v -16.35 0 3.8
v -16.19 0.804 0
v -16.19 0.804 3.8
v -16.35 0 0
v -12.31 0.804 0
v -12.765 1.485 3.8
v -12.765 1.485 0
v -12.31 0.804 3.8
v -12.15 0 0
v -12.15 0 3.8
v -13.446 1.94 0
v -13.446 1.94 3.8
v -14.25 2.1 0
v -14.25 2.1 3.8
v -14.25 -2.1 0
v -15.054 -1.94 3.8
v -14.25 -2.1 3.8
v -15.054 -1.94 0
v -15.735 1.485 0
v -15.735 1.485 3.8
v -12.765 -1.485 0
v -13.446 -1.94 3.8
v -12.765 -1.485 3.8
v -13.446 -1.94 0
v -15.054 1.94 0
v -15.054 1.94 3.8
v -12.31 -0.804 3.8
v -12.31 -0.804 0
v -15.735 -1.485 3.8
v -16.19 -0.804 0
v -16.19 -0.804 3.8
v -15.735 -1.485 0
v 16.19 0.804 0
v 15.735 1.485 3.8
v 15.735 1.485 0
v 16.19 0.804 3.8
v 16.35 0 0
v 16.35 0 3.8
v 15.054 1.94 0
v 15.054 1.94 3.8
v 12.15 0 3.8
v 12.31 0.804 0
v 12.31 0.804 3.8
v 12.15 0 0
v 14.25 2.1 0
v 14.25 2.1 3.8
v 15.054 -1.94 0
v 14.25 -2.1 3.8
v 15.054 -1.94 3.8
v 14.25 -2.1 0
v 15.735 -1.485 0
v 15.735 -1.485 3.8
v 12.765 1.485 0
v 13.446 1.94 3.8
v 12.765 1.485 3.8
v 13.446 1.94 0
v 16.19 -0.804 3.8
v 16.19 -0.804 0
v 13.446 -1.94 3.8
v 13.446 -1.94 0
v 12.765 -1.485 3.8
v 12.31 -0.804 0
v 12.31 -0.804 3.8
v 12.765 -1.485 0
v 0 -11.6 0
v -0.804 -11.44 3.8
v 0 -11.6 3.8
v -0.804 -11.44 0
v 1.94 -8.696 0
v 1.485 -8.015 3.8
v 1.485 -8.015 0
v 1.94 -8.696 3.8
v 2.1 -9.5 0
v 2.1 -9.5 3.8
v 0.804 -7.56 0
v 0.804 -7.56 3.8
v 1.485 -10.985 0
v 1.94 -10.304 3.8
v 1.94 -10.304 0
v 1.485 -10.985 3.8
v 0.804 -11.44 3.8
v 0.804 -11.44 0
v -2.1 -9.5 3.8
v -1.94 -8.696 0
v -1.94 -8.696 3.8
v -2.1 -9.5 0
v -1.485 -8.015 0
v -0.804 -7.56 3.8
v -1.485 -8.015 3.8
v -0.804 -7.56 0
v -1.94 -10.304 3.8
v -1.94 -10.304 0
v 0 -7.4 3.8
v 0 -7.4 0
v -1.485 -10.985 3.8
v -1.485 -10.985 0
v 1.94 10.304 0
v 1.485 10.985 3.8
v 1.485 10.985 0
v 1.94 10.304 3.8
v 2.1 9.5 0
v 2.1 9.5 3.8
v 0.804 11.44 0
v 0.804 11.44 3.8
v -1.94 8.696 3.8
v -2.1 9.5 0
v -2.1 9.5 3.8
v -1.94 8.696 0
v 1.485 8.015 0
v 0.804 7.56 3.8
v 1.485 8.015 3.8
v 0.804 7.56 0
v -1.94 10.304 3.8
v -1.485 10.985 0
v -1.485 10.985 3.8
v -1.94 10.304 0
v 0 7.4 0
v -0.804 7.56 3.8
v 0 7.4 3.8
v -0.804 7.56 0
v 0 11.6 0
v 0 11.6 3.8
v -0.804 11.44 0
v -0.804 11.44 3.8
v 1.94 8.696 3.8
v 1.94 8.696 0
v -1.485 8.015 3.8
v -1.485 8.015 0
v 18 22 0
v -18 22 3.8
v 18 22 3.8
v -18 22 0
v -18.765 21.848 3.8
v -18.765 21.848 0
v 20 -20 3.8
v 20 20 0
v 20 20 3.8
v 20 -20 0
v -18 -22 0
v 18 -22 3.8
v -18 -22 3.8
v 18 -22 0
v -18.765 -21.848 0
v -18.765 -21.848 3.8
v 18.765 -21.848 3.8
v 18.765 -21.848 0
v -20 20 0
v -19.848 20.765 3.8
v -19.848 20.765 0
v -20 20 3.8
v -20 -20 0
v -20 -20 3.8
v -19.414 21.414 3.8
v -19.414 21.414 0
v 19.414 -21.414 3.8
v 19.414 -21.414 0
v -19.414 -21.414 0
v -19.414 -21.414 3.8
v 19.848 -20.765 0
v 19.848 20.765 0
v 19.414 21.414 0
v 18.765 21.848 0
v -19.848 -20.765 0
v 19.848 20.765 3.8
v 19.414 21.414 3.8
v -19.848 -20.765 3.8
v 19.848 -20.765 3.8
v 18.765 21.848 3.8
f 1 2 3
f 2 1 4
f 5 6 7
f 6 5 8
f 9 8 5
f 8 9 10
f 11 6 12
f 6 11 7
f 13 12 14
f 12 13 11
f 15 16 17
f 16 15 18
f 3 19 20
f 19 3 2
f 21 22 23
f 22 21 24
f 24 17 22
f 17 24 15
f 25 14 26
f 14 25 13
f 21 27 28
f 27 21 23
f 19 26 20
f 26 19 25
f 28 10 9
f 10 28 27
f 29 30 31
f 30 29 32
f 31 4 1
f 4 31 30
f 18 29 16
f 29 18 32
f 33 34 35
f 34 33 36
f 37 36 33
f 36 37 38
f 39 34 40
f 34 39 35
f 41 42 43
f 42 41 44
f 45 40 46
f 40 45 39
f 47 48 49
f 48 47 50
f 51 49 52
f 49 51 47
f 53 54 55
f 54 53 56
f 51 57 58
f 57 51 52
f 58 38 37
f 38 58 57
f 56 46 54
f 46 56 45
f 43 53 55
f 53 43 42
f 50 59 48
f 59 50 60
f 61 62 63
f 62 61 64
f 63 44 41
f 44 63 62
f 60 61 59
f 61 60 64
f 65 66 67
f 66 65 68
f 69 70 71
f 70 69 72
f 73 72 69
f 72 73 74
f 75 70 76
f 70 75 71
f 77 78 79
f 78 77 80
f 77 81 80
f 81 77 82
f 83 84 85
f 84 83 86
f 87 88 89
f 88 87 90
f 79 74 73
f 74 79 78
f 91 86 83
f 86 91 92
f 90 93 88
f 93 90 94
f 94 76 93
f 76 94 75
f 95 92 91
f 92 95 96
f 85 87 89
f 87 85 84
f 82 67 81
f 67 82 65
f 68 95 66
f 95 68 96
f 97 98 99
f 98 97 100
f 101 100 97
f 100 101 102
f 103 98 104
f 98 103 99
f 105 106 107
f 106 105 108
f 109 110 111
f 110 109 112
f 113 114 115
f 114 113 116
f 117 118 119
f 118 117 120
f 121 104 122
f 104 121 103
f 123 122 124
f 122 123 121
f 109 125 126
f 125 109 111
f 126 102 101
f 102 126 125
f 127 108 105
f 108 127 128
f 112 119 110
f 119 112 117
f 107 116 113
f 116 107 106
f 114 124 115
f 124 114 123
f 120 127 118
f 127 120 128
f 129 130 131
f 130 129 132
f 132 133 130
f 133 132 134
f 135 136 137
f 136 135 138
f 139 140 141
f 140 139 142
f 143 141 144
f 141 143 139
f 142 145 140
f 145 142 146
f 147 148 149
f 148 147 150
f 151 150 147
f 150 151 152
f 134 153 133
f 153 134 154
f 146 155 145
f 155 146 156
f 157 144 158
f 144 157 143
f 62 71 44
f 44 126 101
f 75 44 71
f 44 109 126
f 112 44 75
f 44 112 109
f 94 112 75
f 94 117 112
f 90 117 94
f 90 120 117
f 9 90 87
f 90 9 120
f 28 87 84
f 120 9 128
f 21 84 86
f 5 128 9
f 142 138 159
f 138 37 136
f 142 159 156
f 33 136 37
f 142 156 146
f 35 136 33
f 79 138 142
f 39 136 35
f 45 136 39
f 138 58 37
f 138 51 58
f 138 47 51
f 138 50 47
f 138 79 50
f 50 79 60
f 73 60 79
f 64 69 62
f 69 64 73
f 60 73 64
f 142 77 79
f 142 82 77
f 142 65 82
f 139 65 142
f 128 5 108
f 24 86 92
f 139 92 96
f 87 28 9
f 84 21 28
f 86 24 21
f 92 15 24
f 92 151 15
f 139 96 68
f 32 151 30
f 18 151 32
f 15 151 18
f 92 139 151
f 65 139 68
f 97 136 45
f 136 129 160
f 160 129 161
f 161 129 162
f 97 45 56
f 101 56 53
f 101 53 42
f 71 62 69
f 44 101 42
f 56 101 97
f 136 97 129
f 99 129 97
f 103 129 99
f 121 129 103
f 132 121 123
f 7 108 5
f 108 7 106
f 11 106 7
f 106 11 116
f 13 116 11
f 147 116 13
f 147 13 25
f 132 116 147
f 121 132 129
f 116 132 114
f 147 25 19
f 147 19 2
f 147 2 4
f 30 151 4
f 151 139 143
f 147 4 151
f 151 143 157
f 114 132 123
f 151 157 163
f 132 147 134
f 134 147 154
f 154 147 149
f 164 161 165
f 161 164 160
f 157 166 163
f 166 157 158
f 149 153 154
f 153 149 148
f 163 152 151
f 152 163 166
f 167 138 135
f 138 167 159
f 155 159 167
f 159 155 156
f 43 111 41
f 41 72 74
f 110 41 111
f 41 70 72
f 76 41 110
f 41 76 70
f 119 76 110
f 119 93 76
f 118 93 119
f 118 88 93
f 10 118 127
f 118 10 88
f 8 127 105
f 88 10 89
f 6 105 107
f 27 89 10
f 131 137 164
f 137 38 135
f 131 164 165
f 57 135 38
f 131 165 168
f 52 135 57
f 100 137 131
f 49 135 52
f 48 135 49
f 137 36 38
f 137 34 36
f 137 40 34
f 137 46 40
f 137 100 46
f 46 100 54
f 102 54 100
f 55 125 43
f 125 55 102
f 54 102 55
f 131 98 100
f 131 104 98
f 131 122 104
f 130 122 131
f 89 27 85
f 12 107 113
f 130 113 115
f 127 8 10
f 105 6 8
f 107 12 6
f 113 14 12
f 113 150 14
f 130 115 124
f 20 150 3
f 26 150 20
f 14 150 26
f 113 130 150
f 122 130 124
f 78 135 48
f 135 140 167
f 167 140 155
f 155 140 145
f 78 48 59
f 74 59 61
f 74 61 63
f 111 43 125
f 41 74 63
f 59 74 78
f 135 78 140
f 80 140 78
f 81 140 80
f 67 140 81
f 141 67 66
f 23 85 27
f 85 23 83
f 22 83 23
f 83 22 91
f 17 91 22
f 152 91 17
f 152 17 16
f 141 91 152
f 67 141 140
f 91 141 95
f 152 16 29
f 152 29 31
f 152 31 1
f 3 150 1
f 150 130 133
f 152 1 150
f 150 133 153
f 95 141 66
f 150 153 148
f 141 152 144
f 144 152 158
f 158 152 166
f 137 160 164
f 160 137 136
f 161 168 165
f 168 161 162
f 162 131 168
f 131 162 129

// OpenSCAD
// Probleme en suspens:
//  - vérifier les cnx jack (2.5 vs 2.1 vs 1x GX16)
//  - hauteur des plots pour les soudure: 1.8 - 2 min => ok
//  - erreur 3V3 vs 3V3_enable
// Historique des problemes
// emplacement ecrous pas assez hauts 0.2/profonds 0.1 => ok, +0.2 et +0.1
// Aggrandir légerement les passage M3: 3.2 => 3.25
// Passe cable USB: on décalle de 16 le meteo temp, et on met un passe cable fin en face les fw_drv => ok
// Impossible de dévisser le capot sans dévisser la saddle => trou de 6.2 et supprimer l'écrou => ok

module cube_rounded(sze, ray) {
  function dir(d) = (d == 0 ? 1 : -1);
  hull() {
    for(X = [0, 1])
      for(Y = [0, 1])
        translate([X * sze[0] + dir(X) * ray, Y * sze[1] + dir(Y) * ray, 0])
          cylinder(r = ray, h=sze[2]);
    }
}

// RJ45:
//          w
//
//       xxxxxxxx
//    h  x      x
//       xxx  xxx
//
rj45_w=15.3;
rj45_l=15.9;
rj45_h=15;
rj45_l_butee=3.1;
rj45_h_butee=3.9;

// RJ12
rj12_w=12.4;
rj12_l=13;
rj12_h=14.7;


bme_y = 19.10;
bme_z = 26.10;
bme_facade_x = 2;
bme_x = 1.7 + bme_facade_x;


fix_m25_length=9.7;
fix_m25_head_length=1.8;
fix_m25_diam=2.5;
fix_m25_head_diam=4.6;
fix_m25_nut_diam=5.6;
fix_m25_nut_length=2;

m3_nut_diam = 6.4;
m3_nut_length = 2.3 + 0.2;
m3_extrude_diam = 3.25;

rounding = 1.5;
function wall_length(id)=(
    id == 0 || id == 2 ? outer_sze[0] : outer_sze[1]
);

  
//Translate to the given wall (outer)
module wall(id) {
  // X axes
  if (id == 0) {
      children();
  }
  // Y axes
  if (id == 1) {
      translate([0, outer_sze[1], 0])
      rotate([0,0,-90])
        children();
  }
  if (id == 2) {
      translate([outer_sze[0], outer_sze[1], 0])
      rotate([0,0,180])
        children();
  }
  if (id == 3) {
      translate([outer_sze[0], 0, 0])
      rotate([0,0,90])
        children();
  }
}

function wall_depth(id)=(
    id == 0 ? wall_x0 :
    id == 1 ? wall_y :
    id == 2 ? wall_x1 :
              wall_y
);


// Move/rotate x/y to the given cover fixation point.
// z is unchanged
module from_case_to_fixation(fixation) {
  wall_id=fixation[0];
  wall(wall_id) {
    p = fixation[1];
    translate([wall_id == 0 || wall_id == 3 ? p : wall_length(wall_id) - p, 0, 0])
      children();
  }
}



// Connector for RJxxx adaptation
// It is separated to keep it printable.
rj_window_y = 22;
rj_window_z = 19;


hole_heater = 11.7 + 0.2;
// Diam jack DC
hole_dc = 10.9;

pcb_sze = [ 110, 76 ];
pcb_size = [ 110, 76];
pcb_ref = [ 1.16, -0.40 ];
inch = 25.4;
pcb_pad_z = 2.2;

pcb_holes =
 [ [ (3.1 - pcb_ref[0]) * inch, pcb_size[1] - (-0.1 - pcb_ref[1]) * inch],
   [ (5.2 - pcb_ref[0]) * inch, pcb_size[1] - (-0.1 - pcb_ref[1]) * inch],
   [ (5.3 - pcb_ref[0]) * inch, pcb_size[1] - ( 2.3 - pcb_ref[1]) * inch],
   [ (1.4 - pcb_ref[0]) * inch, pcb_size[1] - ( 2.3 - pcb_ref[1]) * inch]
 ];

outer_z = 32;


wall_y = 2;
// Matches the size of the USB hub (115)
wall_x0 = 3;
// Wide enough to allow fixation for hub
wall_x1 = 3;
wall_z = 1.5;

inner_sze = [ pcb_sze[0] + 2, pcb_sze[1] + 7, outer_z -  2 * wall_z];
// Outer sizing, including cover
outer_sze = [ inner_sze[0] + 2 * wall_y, inner_sze[1] + wall_x0 + wall_x1, outer_z ];
heater_connections = [
  [31 + 17.5 * 0,outer_z -12],
  [31 + 17.5 * 1,outer_z -12],
  [31 + 17.5 * 2,outer_z -12],
];

// cover_fixations = [
//   // Wall id, position
//   [0, 17],
//   [0, wall_length(0) - 22],
//   [1, wall_length(1) - 52],
//   
//   [3, 51.5]
// ];

hub_ext_height = 24;
vix_center = [ outer_sze[0] / 2, outer_sze[1] / 2 + hub_ext_height / 2];

vix_screw_distance = [ [ 28.5, 0 ], [0, 19 ] ];
vix_screw_diam = 4.20;
// La fixation vixen rouge a besoin d'etre légrement surelevée à cause de sa visse
vix_pad_size = [40, 44 , 3.8];




jacks= [ 
          [ 0, 88, -9],
          [ 3, wall_length(3) - wall_x1 - 11, -7.2 - 0.2 ], 
          [ 3, wall_length(3) - wall_x1 - 26.5, -7.2- 0.2],
          [ 3, wall_length(3) - wall_x1 - 42, -7.2- 0.2 ],  
      ];


// Pour fixer le hub, on laisse deux ouvertures dans le capot,
// Espacée de la longueur du hub + 2mm.
// La piece de fixation pourra venir s'encastrer dans ces ouvertures
// et pourra etre collée sur la parois interieure (ou vissée ?)
fixation_hub_dst = 85.30;
fixation_hub_larg = 2.2;
// De quoi avoir eventuellement une visse de serrage de l'autre coté.
fixation_hub_long = 10;

fixation_hub_dst_entraxe = fixation_hub_dst - 2 * fixation_hub_larg / 2;
fixation_hub = [
  [2, wall_length(2)/ 2 - fixation_hub_dst_entraxe / 2, outer_z/2],
  [2, wall_length(2)/ 2 + fixation_hub_dst_entraxe / 2, outer_z/2],
];

module from_root_to_case() {
  children();
}

module from_case_to_bme() {
  translate([-4.2,40,0])  
    children();
}

module from_bme_to_case_surface() {
  translate([4.2,0,0])
    children();
}

module from_case_to_usb_hole() {
  translate([0,wall_x0 + 76,0])  
    children();
  
}


usb_cable_width = 1.4+0.1;
usb_cable_height= 5.0+0.1;

module usb_hole_contour(h, plus=0) {
  debord_minus = 0.4;
  from_case_to_usb_hole() {
    translate([debord_minus,0,0]) {
      ray_x = (wall_y - debord_minus) + plus;
      ray_y = (wall_y - debord_minus) * 2  + plus;
      scale([ray_x/ray_y, 1, 1])
        cylinder(r=ray_y, h=h,$fn=32);
    }
  }
}

module usb_hole_plus() {
  usb_hole_contour(outer_z - wall_z);
}

module usb_hole_cover() {
  translate([0,0,outer_z - wall_z])
  usb_hole_contour(wall_z, 1.5);
}
//!usb_hole_hole();
module usb_hole_hole() {
  positions = [
    [wall_x0,- 2],[-5,2]
  ];
  
  function rot(VEC, agl) =
    [ VEC[0] * cos(agl) + VEC[1] * sin(agl), VEC[1] * cos(agl) - VEC[0] * sin(agl) ];
  
  inc = 0.1;
  from_case_to_usb_hole() {
    for(I=[0:inc:1 - inc])
      hull() {
        for(J=[I,I+inc]) {
          D = positions[0] + rot((positions[1] - positions[0]) * J, J*30);
          
        //for(D=[[wall_x0,- 2],[-5,2]])
          translate(D)
            translate([0,0,outer_z - wall_z - usb_cable_height])
              cylinder(d=usb_cable_width, h = usb_cable_height + 0.01, $fn=32);
        }
    }
  }
}


module bme_contour(h) {
  translate([-4,-3,0]) {
      ray=1.5;
      cube_rounded([bme_x + 6, bme_y + 6, h], ray, $fn=16);
      sides = 6;
      
      difference() {
        translate([ray, -sides, 0])
          cube([bme_x + 6 - ray, 2 * sides + bme_y + 6, h]);
      
        translate([0, (bme_y + 6) / 2, 0])
          for(I = [-1, 1])
            translate([ray, I * ((bme_y + 6) /2 + sides), -1])
              scale([(sides + 0.75) / sides,1,1])
                cylinder(r=sides, h = h + 2, $fn=32);
      }
    }
}


module bme_cover() {
  from_case_to_bme() {
    translate([0,0,outer_z - wall_z])
      bme_contour(wall_z);
  }
  
  from_case_to_bme() {
    translate([0,0,outer_z - wall_z -2]) {
      translate([-3.1,1,0])
        translate([0.15,0.15, 0])
          cube([3.1-0.3, bme_y -2 - 0.3, 2]);
    }
    /*translate([-3.1,bme_y / 2, outer_z - wall_z -bme_z / 2])
      rotate([0,-90,0])
        translate([0,0,-0.1])
          scale([1,(bme_y + 4)/bme_z,1])
            cylinder(r =bme_z /2 - 1.5, h = 1.2, $fn=32);*/
  }
}

module bme_split() {
  diam = 0.1;
  points = [ 
      [wall_y + diam / 2,    0],
      [wall_y + diam / 2,    (bme_y + 6) / 2 + 0.6],
      [wall_y + diam / 2-0.5,    (bme_y + 6) / 2 + 0.6],
      [wall_y + diam / 2 - 2.5,(bme_y + 6) / 2 - 0.5],
      [wall_y + diam / 2 - 2.5 - 5,(bme_y + 6) / 2 - 0.5 + 5],
      [wall_y + diam / 2 - 2.5 - 15,(bme_y + 6) / 2 - 0.5 + 5],
  ];
  split_h = outer_z - wall_z;
  color("red")
  from_case_to_bme() from_bme_to_case_surface()
    translate([0,-3 + (bme_y + 6) / 2, wall_z + 0.02]) {
      for(sens = [-1, 1])
        scale([1,sens, 1])
          for(i = [0:len(points) - 2]) {
            src = points[i];
            dst = points[i + 1];
            hull() {
              translate(src)
                cylinder(d=diam, h=split_h, $fn=64);
              translate(dst)
                cylinder(d=diam, h=split_h, $fn=64);
            }
      for(i = [0:len(points) - 2]) {
        src = points[i];
        dst = points[i + 1];
        hull() {
          for(sens = [-1, 1])
            scale([1,sens, 1]) {
              translate(src)
                cylinder(d=diam, h=diam, $fn=64);
              translate(dst)
                cylinder(d=diam, h=diam, $fn=64);
            }
        }
      }
    }
  }
}


module bme_plus() {
  from_case_to_bme() {
    bme_contour(outer_z - wall_z);
    
    translate([-3.1,bme_y / 2, outer_z - wall_z -bme_z / 2])
    scale([0.6,(bme_y + 4)/bme_z,1])
      difference() {
        
          sphere(r = bme_z / 2);
        
          sphere(r = bme_z / 2 - 1);
        
        for(J = [ -2, 0, 2])
          rotate([0,J * 15 ,0]) {
            for(I = [ -60,-30, 0, 30, 60 ]) {
              rotate([0,0, I])
                rotate([0,-90,0]) cylinder(d=3.6, $fn=4, h=15);
              rotate([0,I, 0])
                rotate([0,-90,0]) cylinder(d=3.6, $fn=4, h=15);
            }
          }
        for(J = [-3,-1, 1, 3])
          rotate([0,J * 15 ,0])
          for(I = [ -45, -15,15, 45 ])
            rotate([0,0, I])
              rotate([0,-90,0]) cylinder(d=3.6, $fn=4, h=15);
      }
  }
}

module bme_minus() {
  from_case_to_bme() {
    translate([0,0,outer_z - wall_z - bme_z]) {
      cube([bme_x, bme_y, bme_z + 0.1]);
      translate([-3.1,1,0])
        cube([10, bme_y -2, bme_z + 0.1]);
    }
    translate([-3.1,bme_y / 2, outer_z - wall_z -bme_z / 2])
      rotate([0,-90,0])
        translate([0,0,-0.1])
          scale([1,(bme_y + 4)/bme_z,1])
            cylinder(r =bme_z /2 - 1.5, h = 1.2, $fn=32);
  }
}

module bme_facade() {
  bme_sensor_size = 3.2;
  bme_sensor_to_border_x = 1.5;
  bme_sensor_to_border_y = 0.7;

  hole_diam = 3.35;
  hole_dst_to_border_x=1.22;
  hole_dst_to_border_y=0.95;


  hole_dst = 21;
  //  hole_diam = 2.9;
  hole_y = 3.90 - 2.9 / 2;

  bme_pcb = [ 10.8, 13.2 ];
  
  module opening() {
    translate([4,5,1])
    translate([bme_z/2,6.8, 0])
    rotate([0,0,90])
    translate([-bme_z/2,-6.8, 0])
    {
      translate([bme_z / 2, 6.8, 0]) {
        cube([3.3, 3.3, bme_facade_x *2.2], center = true);

        // PCB
        translate([-bme_sensor_size / 2,-bme_sensor_size / 2,bme_facade_x])
          translate([-bme_pcb[0]+bme_sensor_to_border_x + bme_sensor_size, -bme_sensor_to_border_y, 0]) {
            difference() {
              union() {
                cube([bme_pcb[0], bme_pcb[1], 4]);
                translate([0, bme_pcb[1]  - 6, -1.8])
                  cube([bme_pcb[0], 6, 4]);
              }
              translate([hole_dst_to_border_x + hole_diam / 2, hole_dst_to_border_y + hole_diam/2, 0])
                cylinder(d=hole_diam -0.2, $fn=32);
            }
          }
      }

      translate([0,0,bme_facade_x - 1.2 + 0.3])
        translate([bme_z / 2, 6.8, 0])
          for(Z=[0:0.1:bme_facade_x - 1.2 + 5]) {
            translate([0,0, -1 -Z ])
              cube([2 * Z + 3.3, 2 * Z + 3.3, 2], center=true);
          }
    }
    // Petit rabot pour que ça passe...
    translate([-10,-10,-1])
      cube([bme_z + 20, bme_y + 20, 1.2]);
  }
  
  
  difference() {
    union() {
      cube_rounded([bme_z, bme_y, bme_facade_x], 1, $fn=16);
      translate([2,2,bme_facade_x - 1.2 ])
        cube_rounded([bme_z -4, bme_y -4, bme_facade_x+1.5], 1, $fn=16);
    }
    
    opening();
  }
}

module vixen_pad() {
  difference() {
    translate([-vix_pad_size[0] / 2, -vix_pad_size[1] / 2, 0])
      cube_rounded(vix_pad_size, 2, $fn=16);
    for(screw = vix_screw_distance)
      for(X = [-1, 1]) {
        translate([X * screw[0] / 2, X * screw[1] / 2, -0.1])
            cylinder(d=vix_screw_diam, h=vix_pad_size[2] + 0.2, $fn=16);
      }
    }

}

!vixen_pad();
translate([-45,0,0]) bme_facade();


/*
fixation_cover_length = 2.5;
fixation_z = outer_z - wall_z - 6;
module fixation_minus() {
  color("yellow")
  for(fixation = cover_fixations)
  {
    wall_id=fixation[0];
    from_case_to_fixation(fixation)
      translate([0,0,fixation_z])
          rotate([-90,0,0]) {
            // 
            translate([0,0,-1])
              cylinder(d=fix_m25_diam, h = wall_depth(wall_id) + fixation_cover_length + fix_m25_nut_length + 4, $fn=32);
            // head
            translate([0,0,(wall_id == 2 ? 0 : -fix_m25_head_length) - 4])
              cylinder(d=fix_m25_head_diam, h= fix_m25_head_length + 4, $fn=32);
            // nut
            translate([0,0,wall_depth(wall_id) + fixation_cover_length])
              hull() {
                cylinder(d=fix_m25_nut_diam, h = fix_m25_nut_length, $fn=6);
                translate([0,8,0])
                  cylinder(d=fix_m25_nut_diam, h = fix_m25_nut_length, $fn=6);
              }
          }
 
  }
}
module cover_fixation_plus() {
  sx = 10;
  sy = fixation_cover_length + fix_m25_nut_length + 1;
  for(fixation = cover_fixations)
  {
    wall_id=fixation[0];
    from_case_to_fixation(fixation)
    hull() {
      translate([0,0,fixation_z])
          rotate([-90,0,0]) {
            translate([0,0,wall_depth(wall_id) + 0.2])
              cylinder(d=sx, h = sy, $fn=16);
          }
      translate([0,0,outer_z - wall_z]) {
        bsx = sx + 2;
        translate([-bsx / 2, wall_depth(wall_id) + 0.2, 0])
          cube([bsx,sy,wall_z]);
      }
    }
  }
}

*/

module cover_clips() {
    clip_z = 2;
    clip_w = 3;
    delta=0.15;
    difference() {
      from_case_to_inner() 
        difference() {
          translate([delta,delta,outer_z - 2 * wall_z - clip_z])
              cube_rounded(sze = [inner_sze[0] - 2 * delta, inner_sze[1] - 2 *delta, clip_z], ray = rounding, $fn=32);
          translate([clip_w, clip_w, outer_z - 2 * wall_z - clip_z - 0.1])
              cube_rounded(sze = [inner_sze[0] - 2 * clip_w, inner_sze[1] - 2 *clip_w, clip_z+0.2], ray = rounding, $fn=32);
          
        }
      from_case_to_rj_window() {
        translate([0,-4,0])
        cube([16,8 + rj_window_y,45]);
      }
    }
}

module cover() {
  translate([0,0,outer_z - wall_z])
    cube_rounded(sze = [inner_sze[0] + 2 * wall_y, inner_sze[1] + wall_x0 + wall_x1, wall_z], ray=rounding, $fn=32);

}



// Rotate so x+ gets inside the box
module from_case_to_rj_window() {
   // Translate to the x1 wall
  translate([inner_sze[0] + 2 * wall_y, wall_x0 + 7 + rj_window_y, outer_z - wall_z - rj_window_z])
    rotate([0,0,180])
    children();
}

module from_inner_to_pcb() {
  translate([1,1,0])
    children();
}

module from_case_to_inner() {
  translate([wall_y, wall_x0, wall_z])
    children();
}

// Floor
module low_part() {

  from_root_to_case() {
    difference () {

      cube_rounded(sze = [inner_sze[0] + 2 * wall_y, inner_sze[1] + wall_x0 + wall_x1, outer_z - wall_z], ray=rounding, $fn=32);
      from_case_to_inner() {
        cube_rounded(sze = inner_sze + [0,0,10], ray = rounding, $fn=32);
      }
    }
  }
}




module pcb() {
  color("green") 
    from_root_to_case()
      from_case_to_inner()
        from_inner_to_pcb()
          translate([0,0,pcb_pad_z + 0.2])
            cube([pcb_sze[0], pcb_sze[1], 2.5]);
} 

connections_minus();
module connections_minus() {
  color("red")
  from_root_to_case() {
    for(heater = heater_connections) {
      translate([heater[0], -1, heater[1]])
        rotate([-90,0,0]) {
          cylinder(d=hole_heater, $fn=64, h = 6);
          translate([0,0, 1 + wall_depth(0)+0.2])
            cylinder(d=15, $fn=64, h = 0.1);
        }
      
    }
    
    from_case_to_rj_window() {
      translate([-0.1,0,0])
        cube([5,rj_window_y, rj_window_z + 0.05]);
    }
    
    // DC jacks
    for(jack = jacks) {
      wall_id = jack[0];
      p = jack[1];
      z = outer_z - wall_z + jack[2];
      wall(wall_id)
        translate([p,0,z])
          rotate([-90,0,0]) {
            translate([0,0,-1])
              cylinder(d=hole_dc, h = wall_depth(wall_id) + 2, $fn=64);
            // Access ecrou & emprunte cable
            translate([0,0,wall_depth(wall_id)+0.05])
              cylinder(d=15.4, $fn=64, h=15);
          }
    }

    for(fixation = fixation_hub) {
      wall_id = fixation[0];
      p = fixation[1];
      z = fixation[2];
      wall(wall_id)
        translate([p, 0, z])
          rotate([-90,0,0]) {
            translate([0,0,-1])
              cube([fixation_hub_larg, fixation_hub_long, 25], center=true);
          }
    }
  }
}

module cover_rj() {
  wire_space = 3.5;
  advance = 6;
  overflow = 1.2;
  from_case_to_rj_window() {
    difference() {
      translate([-advance+ 0.05, -overflow, rj_window_z])
        cube([19-0.05,rj_window_y + 2 * overflow, wall_z]);
    }  
  }
}

module rj_window() {

  from_case_to_rj_window() {
    wire_space = 3.5;
    advance = 4.82;
    overflow = 1.2;
    
    difference() {
      translate([-advance+ 0.05, -overflow, - overflow])
        cube([17-0.05,rj_window_y + 2 * overflow, rj_window_z + overflow - 0.05]);
      
      // Clip into wall
      color("red") {
        translate([0,-10, -5])
          cube([wall_y+0.2, 10, rj_window_z+5]);
        translate([0, rj_window_y, -5])
          cube([wall_y+0.2, 10, rj_window_z+5]);
        translate([0, -10, -10])
          cube([wall_y+0.2, rj_window_y+20, 10]);
      }
      
      // // RJ45 shadow
      // color("blue")  
      // translate([-advance, 3, rj_window_z - rj45_h])
      //   difference() {
      //     union() {
      //       cube([rj45_l, rj45_w, rj45_h]);
      //       translate([rj45_l-0.01, 2, 0.7])
      //         cube([wire_space, rj45_w - 4, rj45_h - 0.7]);
      //       translate([rj45_l-0.01, 0, 6])
      //         cube([wire_space, rj45_w, rj45_h - 6]);
      //     }
      //     // Butee
      //     translate([-0.1,-0.1,-0.1])
      //     cube([rj45_l_butee+ 0.1, rj45_w + 0.2, rj45_h_butee + 0.1]);
      //   }
      // RJ12 shadow
      color("blue")
      translate([-advance, 4.8, rj_window_z - rj12_h]) {
        
        cube([rj12_l, rj12_w, rj12_h]);

        translate([0,rj12_w / 2, 0]) {
          for(Y = [-rj12_w/2, rj12_w/2])
            translate([5.9,Y,-3.2])
              cylinder(d=2.3, h=60,$fn=30);
          
          cable_w=9;
          cable_h=8.5;
          translate([7, -cable_w/2, -cable_h])
            cube([15, cable_w, cable_h + 10]);

        }



        /*translate([rj12_b_lp, -(rj12_b_w - rj12_w) / 2, 0])
          cube([rj12_b_l, rj12_b_w, rj12_h]);
        translate([rj12_bump_lp, 0, -(rj12_bump_h - rj12_h)])
          cube([rj12_l - rj12_bump_lp, rj12_w, rj12_bump_h]);
        
        translate([rj12_l-0.01, 0, -(rj12_bump_h - rj12_h)]) {
          translate([0,2,0.8])
            cube([wire_space,rj12_w - 4, rj12_bump_h - 0.8]);
          translate([0,0,6])
            cube([wire_space,rj12_w, rj12_bump_h - 6]);
        }*/
         
      }
    }
  }
}

module vix_pad_fixation_minus() {
  color("red")
  for(screw = vix_screw_distance) 
    for(I = [-0.5, 0.5]) {
      translate([I * screw[0], I * screw[1], -10])
        cylinder(d=vix_screw_diam, h=600, $fn=16);
    }
}



module from_root_to_vix() {
  translate([vix_center[0], vix_center[1], 0])
      translate([0,0,outer_z])
        children();
}


// Vixen connector parts
translate([0,0, 40])
from_root_to_vix()
difference() {
  color("yellow")
  union() {
    translate([ - vix_pad_size[0] / 2, - vix_pad_size[1] / 2, 0])
      cube_rounded(vix_pad_size, ray = 4);
  }
  color("red")
      vix_pad_fixation_minus();
  
}


// cover screws
cover_screws_x_spc = 9.5;
cover_screw_fix_diam = 8;
cover_screw_base = cover_screw_fix_diam + 6;


module from_case_to_screws() {
  for(W = [0,2])
    wall(W)
      for(Xi = [0, 1]) {
            X = Xi == 0 ? 0 + cover_screws_x_spc : wall_length(W) - cover_screws_x_spc;
            translate([X, wall_depth(W) - cover_screw_fix_diam / 2, 0]) 
              children();
        }
}

module cover_screw_low_plus() {
  from_case_to_screws() {
    hull() {
      cylinder(d=cover_screw_fix_diam, h = outer_z - wall_z, $fn=64);
      translate([-cover_screw_base/2,cover_screw_fix_diam/2 - 0.15,0])
            cube([cover_screw_base,0.1,outer_z-wall_z]); 
    }
  }
}

module cover_screw_cover_plus() {
  from_case_to_screws() {
      translate([0,0,outer_z - wall_z]) {
        hull() {
          cylinder(d=cover_screw_fix_diam, h = wall_z, $fn=64);
          translate([-cover_screw_base/2,cover_screw_fix_diam/2 - 0.15,0])
            cube([cover_screw_base,0.1,wall_z]); 
        }
      }
  }
}

module cover_screw_minus() {
  from_case_to_screws() {
    translate([0,0,-1])
      cylinder(d=m3_extrude_diam, h= outer_z + 2, $fn=64);
    
    translate([0,0, 10]) {
      hull() {
        cylinder(d=m3_nut_diam, h = m3_nut_length, $fn=6);
        translate([0,10,0]) cylinder(d=m3_nut_diam, h = m3_nut_length, $fn=6);
      }
    }
  }
}

// !intersection() {
// color("yellow")
// translate([36,61,-1])
// cube([80,22,10]);

!difference() {
  union() {
    low_part();
    bme_plus();
    usb_hole_plus();
    from_root_to_case()
      from_case_to_inner()
        from_inner_to_pcb()
          for(hole = pcb_holes)
            translate(hole) 
              cylinder(d=5.8,h=pcb_pad_z,$fn=16);
    from_root_to_case() 
      cover_screw_low_plus();
  }


  bme_split();

  bme_minus();
  usb_hole_hole();
  connections_minus();
  from_root_to_case() 
    cover_screw_minus();
  from_root_to_vix()
    vix_pad_fixation_minus();
  
  from_root_to_case()
      from_case_to_inner()
        from_inner_to_pcb()
          for(hole = pcb_holes)
            translate(hole)
              translate([0,0, -wall_z + 0.4])
                cylinder(d=1.8, h= wall_z - 0.4 + pcb_pad_z + 0.1, $fn=32);
}
// cover_fixation_plus();

pcb();

translate([25,0,15])
rj_window();

// Cover
translate([0,0,25])
difference() {
  union() {
    cover();
    cover_rj();
    bme_cover();
    usb_hole_cover();
    cover_clips();
    from_root_to_case() 
      cover_screw_cover_plus();
  }
  from_root_to_vix()
    vix_pad_fixation_minus();
  
  from_root_to_case() 
    cover_screw_minus();
  connections_minus();
}
